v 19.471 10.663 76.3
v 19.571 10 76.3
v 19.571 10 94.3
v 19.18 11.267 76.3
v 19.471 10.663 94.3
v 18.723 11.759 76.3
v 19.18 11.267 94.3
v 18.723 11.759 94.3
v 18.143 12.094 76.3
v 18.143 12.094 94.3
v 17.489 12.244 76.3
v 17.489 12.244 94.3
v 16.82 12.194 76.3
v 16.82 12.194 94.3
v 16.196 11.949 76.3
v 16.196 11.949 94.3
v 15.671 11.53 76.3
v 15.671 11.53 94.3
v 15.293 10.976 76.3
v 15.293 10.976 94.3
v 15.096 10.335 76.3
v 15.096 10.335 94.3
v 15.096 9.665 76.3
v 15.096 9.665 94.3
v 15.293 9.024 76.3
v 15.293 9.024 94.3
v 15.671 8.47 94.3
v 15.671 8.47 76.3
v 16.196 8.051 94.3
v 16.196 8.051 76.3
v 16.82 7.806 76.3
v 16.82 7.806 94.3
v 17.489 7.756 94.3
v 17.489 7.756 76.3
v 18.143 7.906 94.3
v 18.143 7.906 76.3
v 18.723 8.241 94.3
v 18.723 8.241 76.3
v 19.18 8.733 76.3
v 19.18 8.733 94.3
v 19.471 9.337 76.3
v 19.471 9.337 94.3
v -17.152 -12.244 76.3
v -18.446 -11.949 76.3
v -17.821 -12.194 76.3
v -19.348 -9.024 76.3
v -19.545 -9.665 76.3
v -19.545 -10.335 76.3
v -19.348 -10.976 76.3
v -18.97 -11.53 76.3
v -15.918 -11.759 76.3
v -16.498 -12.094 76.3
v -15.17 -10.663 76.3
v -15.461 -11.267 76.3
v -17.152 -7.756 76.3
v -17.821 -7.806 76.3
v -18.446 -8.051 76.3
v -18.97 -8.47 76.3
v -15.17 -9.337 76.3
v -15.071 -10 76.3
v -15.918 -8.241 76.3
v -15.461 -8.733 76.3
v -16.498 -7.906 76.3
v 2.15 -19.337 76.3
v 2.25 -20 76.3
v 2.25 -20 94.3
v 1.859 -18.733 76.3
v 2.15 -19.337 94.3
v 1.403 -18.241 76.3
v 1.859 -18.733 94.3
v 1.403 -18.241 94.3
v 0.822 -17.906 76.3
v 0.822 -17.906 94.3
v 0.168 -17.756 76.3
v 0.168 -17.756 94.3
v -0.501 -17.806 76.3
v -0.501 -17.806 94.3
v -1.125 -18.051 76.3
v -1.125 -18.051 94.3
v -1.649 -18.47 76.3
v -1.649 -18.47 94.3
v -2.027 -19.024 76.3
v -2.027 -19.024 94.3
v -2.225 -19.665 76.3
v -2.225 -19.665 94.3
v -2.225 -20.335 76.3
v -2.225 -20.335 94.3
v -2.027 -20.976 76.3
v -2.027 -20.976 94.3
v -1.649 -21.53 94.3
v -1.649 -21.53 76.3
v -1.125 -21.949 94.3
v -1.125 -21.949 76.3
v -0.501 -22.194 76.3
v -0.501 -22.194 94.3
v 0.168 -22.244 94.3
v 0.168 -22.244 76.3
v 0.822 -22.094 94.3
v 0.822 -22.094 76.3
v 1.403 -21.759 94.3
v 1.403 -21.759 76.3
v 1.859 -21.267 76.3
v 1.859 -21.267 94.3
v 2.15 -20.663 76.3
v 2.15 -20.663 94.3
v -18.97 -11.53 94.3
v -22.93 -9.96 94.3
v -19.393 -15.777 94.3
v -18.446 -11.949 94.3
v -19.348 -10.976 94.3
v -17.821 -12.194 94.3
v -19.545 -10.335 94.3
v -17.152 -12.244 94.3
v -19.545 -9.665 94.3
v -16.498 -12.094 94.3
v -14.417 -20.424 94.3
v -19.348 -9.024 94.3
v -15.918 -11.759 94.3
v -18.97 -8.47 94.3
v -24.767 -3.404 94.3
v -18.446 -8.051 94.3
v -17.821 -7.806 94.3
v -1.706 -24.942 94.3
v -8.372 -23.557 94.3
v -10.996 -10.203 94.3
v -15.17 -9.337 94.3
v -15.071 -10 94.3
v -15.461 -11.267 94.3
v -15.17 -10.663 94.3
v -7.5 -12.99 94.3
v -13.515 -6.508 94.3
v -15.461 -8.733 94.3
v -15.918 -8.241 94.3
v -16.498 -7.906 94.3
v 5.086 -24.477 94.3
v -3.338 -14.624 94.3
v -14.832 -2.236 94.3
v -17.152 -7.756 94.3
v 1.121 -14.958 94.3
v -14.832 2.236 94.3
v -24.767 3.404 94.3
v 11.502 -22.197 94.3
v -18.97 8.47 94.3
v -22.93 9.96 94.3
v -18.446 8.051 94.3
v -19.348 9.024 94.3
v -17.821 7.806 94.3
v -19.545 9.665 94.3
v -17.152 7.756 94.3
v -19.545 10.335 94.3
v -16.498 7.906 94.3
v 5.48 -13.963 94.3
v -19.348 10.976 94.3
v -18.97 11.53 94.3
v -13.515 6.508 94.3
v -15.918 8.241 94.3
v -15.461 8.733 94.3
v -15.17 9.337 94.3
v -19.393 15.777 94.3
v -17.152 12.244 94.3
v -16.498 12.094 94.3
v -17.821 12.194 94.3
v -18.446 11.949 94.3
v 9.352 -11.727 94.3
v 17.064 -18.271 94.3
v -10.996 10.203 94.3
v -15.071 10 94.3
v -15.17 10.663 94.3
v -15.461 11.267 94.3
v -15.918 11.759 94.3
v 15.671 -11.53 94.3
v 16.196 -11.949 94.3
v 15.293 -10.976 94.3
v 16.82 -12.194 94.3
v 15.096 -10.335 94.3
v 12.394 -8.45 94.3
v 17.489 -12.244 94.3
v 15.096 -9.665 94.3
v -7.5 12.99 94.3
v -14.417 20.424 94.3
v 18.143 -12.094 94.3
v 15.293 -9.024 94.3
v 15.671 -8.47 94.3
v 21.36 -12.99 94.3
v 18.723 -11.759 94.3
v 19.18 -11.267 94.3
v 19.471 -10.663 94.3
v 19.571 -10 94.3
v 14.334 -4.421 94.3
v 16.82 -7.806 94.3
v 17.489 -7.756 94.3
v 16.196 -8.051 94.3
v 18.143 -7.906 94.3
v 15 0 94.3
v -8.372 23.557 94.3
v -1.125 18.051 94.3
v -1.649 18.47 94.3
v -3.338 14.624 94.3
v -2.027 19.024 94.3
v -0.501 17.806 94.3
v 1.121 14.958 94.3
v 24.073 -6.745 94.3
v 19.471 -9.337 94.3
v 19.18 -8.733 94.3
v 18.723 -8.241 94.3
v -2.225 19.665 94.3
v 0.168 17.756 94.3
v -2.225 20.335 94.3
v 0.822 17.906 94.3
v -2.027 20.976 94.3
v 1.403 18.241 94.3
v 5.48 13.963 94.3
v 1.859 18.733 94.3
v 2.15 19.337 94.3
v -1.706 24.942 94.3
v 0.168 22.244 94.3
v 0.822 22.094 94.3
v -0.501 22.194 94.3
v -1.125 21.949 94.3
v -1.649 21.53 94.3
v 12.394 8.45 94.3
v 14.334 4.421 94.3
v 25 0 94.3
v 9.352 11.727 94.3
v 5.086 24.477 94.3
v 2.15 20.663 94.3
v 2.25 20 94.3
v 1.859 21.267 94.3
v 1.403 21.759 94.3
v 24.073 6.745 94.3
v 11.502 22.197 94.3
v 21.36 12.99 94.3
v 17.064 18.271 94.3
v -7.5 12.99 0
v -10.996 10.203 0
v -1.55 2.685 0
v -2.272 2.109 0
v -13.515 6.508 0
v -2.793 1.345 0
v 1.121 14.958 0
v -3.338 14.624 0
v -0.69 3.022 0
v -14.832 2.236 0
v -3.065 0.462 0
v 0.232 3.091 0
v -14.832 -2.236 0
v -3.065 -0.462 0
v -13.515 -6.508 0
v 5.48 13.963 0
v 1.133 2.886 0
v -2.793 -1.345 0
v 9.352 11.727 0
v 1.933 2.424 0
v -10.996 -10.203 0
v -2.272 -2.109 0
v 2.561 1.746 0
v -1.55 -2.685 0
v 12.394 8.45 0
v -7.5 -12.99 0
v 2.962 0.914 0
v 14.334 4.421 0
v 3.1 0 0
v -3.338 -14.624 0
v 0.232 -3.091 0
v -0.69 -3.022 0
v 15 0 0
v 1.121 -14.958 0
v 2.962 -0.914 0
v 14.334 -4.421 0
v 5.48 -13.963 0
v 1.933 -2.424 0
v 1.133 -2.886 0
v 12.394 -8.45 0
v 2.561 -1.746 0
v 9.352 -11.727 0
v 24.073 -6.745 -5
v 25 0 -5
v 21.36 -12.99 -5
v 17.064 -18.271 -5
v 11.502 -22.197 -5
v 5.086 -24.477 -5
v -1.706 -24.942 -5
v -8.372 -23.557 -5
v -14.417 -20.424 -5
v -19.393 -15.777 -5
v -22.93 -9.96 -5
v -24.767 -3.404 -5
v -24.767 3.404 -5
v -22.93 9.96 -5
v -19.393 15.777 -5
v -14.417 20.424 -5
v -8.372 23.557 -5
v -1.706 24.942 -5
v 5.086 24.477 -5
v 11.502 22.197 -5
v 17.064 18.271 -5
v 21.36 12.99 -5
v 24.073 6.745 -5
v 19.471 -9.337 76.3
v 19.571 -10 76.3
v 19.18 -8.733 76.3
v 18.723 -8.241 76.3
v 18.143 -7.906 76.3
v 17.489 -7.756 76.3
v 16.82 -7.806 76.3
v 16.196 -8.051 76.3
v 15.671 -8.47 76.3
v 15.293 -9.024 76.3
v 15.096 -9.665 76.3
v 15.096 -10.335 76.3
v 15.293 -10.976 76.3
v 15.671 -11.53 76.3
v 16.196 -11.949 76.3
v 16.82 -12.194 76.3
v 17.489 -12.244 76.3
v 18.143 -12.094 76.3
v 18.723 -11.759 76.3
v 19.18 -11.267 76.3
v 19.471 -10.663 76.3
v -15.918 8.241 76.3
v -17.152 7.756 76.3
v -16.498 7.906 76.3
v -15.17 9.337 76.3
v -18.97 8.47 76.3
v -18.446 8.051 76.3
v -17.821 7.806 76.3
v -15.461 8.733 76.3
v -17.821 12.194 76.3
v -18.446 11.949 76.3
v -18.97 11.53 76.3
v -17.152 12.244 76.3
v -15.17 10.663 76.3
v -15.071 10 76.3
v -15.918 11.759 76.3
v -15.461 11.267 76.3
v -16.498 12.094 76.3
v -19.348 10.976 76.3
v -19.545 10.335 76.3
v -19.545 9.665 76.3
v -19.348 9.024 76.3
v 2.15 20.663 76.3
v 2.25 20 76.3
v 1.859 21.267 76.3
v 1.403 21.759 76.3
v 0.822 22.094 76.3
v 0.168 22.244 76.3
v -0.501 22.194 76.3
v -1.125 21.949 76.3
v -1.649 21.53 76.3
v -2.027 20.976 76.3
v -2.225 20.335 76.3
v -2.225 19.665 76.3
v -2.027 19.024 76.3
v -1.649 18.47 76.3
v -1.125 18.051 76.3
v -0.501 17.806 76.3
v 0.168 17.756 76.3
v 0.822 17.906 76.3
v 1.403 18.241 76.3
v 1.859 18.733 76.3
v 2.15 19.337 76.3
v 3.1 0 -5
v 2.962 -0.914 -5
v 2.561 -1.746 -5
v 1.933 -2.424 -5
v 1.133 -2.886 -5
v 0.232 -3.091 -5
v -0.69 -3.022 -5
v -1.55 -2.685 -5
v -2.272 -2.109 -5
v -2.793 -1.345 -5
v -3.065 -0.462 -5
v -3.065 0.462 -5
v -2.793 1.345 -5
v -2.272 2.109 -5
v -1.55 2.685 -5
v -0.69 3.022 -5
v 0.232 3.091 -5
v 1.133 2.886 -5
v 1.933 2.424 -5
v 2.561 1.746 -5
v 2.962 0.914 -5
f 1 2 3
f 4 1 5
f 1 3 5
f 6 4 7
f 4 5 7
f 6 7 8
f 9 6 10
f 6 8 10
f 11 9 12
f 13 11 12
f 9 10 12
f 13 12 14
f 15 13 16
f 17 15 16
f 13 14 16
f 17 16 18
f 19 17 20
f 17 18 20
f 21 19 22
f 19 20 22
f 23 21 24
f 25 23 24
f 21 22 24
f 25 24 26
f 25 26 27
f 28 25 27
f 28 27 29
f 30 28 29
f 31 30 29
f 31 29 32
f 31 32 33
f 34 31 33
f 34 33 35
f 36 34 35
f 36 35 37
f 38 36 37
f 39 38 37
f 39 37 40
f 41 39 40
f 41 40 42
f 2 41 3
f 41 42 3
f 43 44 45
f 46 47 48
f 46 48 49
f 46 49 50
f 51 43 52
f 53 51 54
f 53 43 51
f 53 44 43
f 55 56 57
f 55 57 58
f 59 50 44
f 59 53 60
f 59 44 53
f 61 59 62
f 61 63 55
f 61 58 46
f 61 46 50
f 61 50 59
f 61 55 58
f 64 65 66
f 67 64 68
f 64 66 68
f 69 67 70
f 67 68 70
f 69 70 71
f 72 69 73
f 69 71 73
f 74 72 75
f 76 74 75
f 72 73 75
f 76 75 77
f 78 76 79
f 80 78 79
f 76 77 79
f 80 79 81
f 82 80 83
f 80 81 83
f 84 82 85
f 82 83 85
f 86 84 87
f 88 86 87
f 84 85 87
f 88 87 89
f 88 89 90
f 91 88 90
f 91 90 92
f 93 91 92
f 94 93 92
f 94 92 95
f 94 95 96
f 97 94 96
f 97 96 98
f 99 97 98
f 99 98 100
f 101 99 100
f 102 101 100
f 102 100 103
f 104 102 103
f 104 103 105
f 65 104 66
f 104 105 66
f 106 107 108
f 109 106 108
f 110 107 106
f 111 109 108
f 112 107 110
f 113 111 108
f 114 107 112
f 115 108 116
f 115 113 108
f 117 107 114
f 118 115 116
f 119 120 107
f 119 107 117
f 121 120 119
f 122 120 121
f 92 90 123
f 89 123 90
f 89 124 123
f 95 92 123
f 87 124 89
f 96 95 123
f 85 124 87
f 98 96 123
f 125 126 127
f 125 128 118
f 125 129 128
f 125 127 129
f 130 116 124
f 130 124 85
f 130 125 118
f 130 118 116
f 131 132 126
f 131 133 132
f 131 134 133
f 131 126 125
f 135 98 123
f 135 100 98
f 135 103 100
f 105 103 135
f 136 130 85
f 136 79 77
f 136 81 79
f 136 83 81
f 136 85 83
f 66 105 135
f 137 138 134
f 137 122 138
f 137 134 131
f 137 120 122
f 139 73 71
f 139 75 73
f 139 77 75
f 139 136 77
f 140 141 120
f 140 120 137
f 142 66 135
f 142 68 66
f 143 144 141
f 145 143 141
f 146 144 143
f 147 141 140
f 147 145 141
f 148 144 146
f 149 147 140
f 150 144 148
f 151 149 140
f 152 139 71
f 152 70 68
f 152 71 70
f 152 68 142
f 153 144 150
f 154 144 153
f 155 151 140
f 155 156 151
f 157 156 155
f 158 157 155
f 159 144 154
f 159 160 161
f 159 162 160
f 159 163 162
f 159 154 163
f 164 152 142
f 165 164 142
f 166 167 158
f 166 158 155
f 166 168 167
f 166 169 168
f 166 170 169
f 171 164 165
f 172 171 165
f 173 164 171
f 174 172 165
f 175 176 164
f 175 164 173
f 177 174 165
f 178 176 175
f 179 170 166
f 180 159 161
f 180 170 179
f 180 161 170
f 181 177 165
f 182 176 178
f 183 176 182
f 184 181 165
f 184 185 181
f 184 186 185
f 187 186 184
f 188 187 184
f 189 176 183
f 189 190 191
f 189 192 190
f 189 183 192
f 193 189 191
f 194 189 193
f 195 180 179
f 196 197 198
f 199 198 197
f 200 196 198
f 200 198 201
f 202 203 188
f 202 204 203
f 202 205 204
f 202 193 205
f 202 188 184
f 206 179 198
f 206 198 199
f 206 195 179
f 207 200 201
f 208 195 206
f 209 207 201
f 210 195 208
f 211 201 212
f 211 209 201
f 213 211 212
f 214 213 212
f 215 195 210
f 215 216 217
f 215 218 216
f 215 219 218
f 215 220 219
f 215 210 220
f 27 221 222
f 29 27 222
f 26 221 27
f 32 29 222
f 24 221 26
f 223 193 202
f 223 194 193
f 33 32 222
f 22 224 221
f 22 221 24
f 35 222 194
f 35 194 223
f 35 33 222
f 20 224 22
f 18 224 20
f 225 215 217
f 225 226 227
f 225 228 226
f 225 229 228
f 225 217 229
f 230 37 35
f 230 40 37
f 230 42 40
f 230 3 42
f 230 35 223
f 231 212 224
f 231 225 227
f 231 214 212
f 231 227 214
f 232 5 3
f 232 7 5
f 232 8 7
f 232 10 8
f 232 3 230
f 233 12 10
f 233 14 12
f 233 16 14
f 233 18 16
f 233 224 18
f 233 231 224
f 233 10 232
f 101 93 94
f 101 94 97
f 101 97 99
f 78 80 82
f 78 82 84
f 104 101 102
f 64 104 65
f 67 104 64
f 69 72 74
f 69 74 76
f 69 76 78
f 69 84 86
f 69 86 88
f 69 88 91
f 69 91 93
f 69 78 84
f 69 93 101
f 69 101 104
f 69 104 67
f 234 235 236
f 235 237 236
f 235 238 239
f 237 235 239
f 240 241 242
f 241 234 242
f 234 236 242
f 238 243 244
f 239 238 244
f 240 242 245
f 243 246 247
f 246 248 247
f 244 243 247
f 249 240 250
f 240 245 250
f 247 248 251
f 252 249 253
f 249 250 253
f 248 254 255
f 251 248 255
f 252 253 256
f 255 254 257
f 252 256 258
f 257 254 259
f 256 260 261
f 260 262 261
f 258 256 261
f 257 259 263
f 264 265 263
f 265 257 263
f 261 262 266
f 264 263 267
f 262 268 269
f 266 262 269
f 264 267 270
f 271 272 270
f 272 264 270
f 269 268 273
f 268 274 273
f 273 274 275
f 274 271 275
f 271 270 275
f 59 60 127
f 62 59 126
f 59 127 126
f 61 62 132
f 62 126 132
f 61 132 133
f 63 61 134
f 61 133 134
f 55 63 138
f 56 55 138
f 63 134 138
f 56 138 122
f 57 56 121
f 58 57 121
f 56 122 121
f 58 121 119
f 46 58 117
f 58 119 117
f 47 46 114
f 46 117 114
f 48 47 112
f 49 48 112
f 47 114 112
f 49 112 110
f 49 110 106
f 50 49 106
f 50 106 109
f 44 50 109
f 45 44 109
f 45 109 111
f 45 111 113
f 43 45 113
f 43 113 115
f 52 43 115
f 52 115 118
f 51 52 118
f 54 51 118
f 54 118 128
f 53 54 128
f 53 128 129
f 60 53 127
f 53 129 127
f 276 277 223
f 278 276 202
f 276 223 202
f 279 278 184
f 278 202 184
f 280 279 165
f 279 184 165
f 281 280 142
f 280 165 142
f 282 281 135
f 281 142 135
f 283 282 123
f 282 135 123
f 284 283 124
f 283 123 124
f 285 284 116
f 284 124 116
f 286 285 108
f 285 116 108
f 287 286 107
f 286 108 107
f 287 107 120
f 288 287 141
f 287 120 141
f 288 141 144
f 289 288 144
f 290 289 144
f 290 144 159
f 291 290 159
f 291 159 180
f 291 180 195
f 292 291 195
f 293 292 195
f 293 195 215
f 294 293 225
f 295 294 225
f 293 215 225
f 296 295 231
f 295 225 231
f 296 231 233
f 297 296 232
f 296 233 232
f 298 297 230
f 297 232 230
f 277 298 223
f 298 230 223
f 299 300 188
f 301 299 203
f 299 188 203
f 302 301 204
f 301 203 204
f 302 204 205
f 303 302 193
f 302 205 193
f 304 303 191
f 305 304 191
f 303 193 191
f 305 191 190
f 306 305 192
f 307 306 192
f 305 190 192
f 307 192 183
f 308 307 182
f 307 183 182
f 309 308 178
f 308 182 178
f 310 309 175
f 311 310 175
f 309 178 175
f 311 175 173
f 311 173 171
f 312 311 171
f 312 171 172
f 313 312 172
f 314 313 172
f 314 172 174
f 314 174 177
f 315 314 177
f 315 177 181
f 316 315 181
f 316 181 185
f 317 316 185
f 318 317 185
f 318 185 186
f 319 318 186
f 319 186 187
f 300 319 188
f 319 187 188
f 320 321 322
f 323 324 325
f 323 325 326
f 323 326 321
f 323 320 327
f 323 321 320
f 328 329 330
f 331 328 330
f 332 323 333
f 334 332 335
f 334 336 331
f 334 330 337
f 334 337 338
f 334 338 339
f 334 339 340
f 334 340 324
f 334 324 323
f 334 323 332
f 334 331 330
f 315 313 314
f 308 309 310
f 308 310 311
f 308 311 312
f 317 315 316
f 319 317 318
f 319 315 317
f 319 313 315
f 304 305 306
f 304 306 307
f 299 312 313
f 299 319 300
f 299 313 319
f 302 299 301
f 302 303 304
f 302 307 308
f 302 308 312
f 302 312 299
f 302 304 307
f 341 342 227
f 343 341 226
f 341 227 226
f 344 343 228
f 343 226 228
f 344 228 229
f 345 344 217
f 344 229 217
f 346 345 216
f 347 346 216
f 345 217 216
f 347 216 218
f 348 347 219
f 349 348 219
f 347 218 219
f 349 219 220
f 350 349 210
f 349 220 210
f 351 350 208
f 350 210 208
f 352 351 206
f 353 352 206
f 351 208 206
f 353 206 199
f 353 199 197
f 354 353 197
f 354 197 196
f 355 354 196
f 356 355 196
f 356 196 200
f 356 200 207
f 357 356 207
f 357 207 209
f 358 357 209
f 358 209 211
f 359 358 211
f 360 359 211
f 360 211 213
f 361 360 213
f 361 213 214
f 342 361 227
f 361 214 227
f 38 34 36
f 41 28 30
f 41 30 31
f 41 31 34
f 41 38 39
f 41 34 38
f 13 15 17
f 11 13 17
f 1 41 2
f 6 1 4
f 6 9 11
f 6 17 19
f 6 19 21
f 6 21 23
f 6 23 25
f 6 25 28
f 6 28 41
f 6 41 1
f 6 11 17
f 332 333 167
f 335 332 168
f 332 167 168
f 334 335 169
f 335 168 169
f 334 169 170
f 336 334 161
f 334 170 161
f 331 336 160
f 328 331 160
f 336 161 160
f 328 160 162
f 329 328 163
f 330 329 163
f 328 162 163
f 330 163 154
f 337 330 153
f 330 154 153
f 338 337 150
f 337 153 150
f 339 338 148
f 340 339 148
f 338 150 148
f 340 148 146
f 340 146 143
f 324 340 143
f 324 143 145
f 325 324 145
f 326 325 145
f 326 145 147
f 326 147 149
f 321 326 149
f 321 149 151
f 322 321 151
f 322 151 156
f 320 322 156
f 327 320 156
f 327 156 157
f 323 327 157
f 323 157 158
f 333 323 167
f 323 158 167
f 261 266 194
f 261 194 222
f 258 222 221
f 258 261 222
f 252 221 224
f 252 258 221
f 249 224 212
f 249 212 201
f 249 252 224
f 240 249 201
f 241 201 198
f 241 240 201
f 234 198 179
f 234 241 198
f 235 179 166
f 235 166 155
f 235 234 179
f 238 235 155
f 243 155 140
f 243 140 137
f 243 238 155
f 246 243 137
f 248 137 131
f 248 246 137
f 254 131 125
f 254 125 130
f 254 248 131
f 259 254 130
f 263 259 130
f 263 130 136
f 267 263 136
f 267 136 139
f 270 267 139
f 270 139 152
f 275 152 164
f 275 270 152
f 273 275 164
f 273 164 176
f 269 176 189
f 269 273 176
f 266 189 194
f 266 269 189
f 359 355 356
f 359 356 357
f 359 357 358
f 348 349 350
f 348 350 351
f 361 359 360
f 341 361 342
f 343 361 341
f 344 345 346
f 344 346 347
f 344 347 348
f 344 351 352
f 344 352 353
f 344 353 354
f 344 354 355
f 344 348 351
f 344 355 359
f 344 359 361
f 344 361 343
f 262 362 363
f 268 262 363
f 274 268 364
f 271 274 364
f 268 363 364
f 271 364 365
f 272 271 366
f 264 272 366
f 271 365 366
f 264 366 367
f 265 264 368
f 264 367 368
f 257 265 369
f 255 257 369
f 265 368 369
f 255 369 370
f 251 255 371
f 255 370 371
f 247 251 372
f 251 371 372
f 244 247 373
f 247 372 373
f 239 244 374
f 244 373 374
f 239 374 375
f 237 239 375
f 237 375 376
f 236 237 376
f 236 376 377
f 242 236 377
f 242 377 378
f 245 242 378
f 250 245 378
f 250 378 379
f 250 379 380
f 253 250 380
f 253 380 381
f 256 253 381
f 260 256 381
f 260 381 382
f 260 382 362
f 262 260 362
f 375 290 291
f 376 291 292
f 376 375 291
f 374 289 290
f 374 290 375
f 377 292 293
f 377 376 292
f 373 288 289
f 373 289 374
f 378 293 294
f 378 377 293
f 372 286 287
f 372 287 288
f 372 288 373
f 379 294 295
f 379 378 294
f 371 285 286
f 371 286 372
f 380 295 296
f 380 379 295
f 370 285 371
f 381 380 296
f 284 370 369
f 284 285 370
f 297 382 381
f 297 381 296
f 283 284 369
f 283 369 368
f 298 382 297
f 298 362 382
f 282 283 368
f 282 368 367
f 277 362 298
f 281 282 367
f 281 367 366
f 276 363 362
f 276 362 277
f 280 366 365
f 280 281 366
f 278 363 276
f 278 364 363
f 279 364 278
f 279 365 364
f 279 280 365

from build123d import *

# Parameters (mm, degrees)
F0_R     = 25
F0_R_2   = 15
F1_DEPTH = 94.3
F2_R     = 2.25
F3_DEPTH = 18
F4_R     = 25
F5_DEPTH = 5
F6_R     = 3.1
F7_DEPTH = 25


with BuildPart() as f1:
    # F0 (on Top) → F1 (new body)
    with BuildSketch(Plane.XY):
        Circle(F0_R)
        Circle(F0_R_2, mode=Mode.SUBTRACT)
    extrude(amount=F1_DEPTH)

    # F2 (on face) → F3 (cut)
    with BuildSketch(Plane.XY.offset(94.3)):
        with Locations((0, 20)):
            Circle(F2_R)
        with Locations((-17.320508, -10)):
            Circle(F2_R)
        with Locations((17.320508, -10)):
            Circle(F2_R)
        with Locations((0, -20)):
            Circle(F2_R)
        with Locations((17.320508, 10)):
            Circle(F2_R)
        with Locations((-17.320508, 10)):
            Circle(F2_R)
    extrude(amount=-F3_DEPTH, mode=Mode.SUBTRACT)

    # F4 (on face) → F5 (join)
    with BuildSketch(Plane(origin=(0, 0, 0), x_dir=(1, 0, 0), z_dir=(0, 0, -1))):
        Circle(F4_R)
    extrude(amount=F5_DEPTH)

    # F6 (on face) → F7 (cut)
    with BuildSketch(Plane(origin=(0, 0, -5), x_dir=(1, 0, 0), z_dir=(0, 0, -1))):
        Circle(F6_R)
    extrude(amount=-F7_DEPTH, mode=Mode.SUBTRACT)


solid = f1.part
